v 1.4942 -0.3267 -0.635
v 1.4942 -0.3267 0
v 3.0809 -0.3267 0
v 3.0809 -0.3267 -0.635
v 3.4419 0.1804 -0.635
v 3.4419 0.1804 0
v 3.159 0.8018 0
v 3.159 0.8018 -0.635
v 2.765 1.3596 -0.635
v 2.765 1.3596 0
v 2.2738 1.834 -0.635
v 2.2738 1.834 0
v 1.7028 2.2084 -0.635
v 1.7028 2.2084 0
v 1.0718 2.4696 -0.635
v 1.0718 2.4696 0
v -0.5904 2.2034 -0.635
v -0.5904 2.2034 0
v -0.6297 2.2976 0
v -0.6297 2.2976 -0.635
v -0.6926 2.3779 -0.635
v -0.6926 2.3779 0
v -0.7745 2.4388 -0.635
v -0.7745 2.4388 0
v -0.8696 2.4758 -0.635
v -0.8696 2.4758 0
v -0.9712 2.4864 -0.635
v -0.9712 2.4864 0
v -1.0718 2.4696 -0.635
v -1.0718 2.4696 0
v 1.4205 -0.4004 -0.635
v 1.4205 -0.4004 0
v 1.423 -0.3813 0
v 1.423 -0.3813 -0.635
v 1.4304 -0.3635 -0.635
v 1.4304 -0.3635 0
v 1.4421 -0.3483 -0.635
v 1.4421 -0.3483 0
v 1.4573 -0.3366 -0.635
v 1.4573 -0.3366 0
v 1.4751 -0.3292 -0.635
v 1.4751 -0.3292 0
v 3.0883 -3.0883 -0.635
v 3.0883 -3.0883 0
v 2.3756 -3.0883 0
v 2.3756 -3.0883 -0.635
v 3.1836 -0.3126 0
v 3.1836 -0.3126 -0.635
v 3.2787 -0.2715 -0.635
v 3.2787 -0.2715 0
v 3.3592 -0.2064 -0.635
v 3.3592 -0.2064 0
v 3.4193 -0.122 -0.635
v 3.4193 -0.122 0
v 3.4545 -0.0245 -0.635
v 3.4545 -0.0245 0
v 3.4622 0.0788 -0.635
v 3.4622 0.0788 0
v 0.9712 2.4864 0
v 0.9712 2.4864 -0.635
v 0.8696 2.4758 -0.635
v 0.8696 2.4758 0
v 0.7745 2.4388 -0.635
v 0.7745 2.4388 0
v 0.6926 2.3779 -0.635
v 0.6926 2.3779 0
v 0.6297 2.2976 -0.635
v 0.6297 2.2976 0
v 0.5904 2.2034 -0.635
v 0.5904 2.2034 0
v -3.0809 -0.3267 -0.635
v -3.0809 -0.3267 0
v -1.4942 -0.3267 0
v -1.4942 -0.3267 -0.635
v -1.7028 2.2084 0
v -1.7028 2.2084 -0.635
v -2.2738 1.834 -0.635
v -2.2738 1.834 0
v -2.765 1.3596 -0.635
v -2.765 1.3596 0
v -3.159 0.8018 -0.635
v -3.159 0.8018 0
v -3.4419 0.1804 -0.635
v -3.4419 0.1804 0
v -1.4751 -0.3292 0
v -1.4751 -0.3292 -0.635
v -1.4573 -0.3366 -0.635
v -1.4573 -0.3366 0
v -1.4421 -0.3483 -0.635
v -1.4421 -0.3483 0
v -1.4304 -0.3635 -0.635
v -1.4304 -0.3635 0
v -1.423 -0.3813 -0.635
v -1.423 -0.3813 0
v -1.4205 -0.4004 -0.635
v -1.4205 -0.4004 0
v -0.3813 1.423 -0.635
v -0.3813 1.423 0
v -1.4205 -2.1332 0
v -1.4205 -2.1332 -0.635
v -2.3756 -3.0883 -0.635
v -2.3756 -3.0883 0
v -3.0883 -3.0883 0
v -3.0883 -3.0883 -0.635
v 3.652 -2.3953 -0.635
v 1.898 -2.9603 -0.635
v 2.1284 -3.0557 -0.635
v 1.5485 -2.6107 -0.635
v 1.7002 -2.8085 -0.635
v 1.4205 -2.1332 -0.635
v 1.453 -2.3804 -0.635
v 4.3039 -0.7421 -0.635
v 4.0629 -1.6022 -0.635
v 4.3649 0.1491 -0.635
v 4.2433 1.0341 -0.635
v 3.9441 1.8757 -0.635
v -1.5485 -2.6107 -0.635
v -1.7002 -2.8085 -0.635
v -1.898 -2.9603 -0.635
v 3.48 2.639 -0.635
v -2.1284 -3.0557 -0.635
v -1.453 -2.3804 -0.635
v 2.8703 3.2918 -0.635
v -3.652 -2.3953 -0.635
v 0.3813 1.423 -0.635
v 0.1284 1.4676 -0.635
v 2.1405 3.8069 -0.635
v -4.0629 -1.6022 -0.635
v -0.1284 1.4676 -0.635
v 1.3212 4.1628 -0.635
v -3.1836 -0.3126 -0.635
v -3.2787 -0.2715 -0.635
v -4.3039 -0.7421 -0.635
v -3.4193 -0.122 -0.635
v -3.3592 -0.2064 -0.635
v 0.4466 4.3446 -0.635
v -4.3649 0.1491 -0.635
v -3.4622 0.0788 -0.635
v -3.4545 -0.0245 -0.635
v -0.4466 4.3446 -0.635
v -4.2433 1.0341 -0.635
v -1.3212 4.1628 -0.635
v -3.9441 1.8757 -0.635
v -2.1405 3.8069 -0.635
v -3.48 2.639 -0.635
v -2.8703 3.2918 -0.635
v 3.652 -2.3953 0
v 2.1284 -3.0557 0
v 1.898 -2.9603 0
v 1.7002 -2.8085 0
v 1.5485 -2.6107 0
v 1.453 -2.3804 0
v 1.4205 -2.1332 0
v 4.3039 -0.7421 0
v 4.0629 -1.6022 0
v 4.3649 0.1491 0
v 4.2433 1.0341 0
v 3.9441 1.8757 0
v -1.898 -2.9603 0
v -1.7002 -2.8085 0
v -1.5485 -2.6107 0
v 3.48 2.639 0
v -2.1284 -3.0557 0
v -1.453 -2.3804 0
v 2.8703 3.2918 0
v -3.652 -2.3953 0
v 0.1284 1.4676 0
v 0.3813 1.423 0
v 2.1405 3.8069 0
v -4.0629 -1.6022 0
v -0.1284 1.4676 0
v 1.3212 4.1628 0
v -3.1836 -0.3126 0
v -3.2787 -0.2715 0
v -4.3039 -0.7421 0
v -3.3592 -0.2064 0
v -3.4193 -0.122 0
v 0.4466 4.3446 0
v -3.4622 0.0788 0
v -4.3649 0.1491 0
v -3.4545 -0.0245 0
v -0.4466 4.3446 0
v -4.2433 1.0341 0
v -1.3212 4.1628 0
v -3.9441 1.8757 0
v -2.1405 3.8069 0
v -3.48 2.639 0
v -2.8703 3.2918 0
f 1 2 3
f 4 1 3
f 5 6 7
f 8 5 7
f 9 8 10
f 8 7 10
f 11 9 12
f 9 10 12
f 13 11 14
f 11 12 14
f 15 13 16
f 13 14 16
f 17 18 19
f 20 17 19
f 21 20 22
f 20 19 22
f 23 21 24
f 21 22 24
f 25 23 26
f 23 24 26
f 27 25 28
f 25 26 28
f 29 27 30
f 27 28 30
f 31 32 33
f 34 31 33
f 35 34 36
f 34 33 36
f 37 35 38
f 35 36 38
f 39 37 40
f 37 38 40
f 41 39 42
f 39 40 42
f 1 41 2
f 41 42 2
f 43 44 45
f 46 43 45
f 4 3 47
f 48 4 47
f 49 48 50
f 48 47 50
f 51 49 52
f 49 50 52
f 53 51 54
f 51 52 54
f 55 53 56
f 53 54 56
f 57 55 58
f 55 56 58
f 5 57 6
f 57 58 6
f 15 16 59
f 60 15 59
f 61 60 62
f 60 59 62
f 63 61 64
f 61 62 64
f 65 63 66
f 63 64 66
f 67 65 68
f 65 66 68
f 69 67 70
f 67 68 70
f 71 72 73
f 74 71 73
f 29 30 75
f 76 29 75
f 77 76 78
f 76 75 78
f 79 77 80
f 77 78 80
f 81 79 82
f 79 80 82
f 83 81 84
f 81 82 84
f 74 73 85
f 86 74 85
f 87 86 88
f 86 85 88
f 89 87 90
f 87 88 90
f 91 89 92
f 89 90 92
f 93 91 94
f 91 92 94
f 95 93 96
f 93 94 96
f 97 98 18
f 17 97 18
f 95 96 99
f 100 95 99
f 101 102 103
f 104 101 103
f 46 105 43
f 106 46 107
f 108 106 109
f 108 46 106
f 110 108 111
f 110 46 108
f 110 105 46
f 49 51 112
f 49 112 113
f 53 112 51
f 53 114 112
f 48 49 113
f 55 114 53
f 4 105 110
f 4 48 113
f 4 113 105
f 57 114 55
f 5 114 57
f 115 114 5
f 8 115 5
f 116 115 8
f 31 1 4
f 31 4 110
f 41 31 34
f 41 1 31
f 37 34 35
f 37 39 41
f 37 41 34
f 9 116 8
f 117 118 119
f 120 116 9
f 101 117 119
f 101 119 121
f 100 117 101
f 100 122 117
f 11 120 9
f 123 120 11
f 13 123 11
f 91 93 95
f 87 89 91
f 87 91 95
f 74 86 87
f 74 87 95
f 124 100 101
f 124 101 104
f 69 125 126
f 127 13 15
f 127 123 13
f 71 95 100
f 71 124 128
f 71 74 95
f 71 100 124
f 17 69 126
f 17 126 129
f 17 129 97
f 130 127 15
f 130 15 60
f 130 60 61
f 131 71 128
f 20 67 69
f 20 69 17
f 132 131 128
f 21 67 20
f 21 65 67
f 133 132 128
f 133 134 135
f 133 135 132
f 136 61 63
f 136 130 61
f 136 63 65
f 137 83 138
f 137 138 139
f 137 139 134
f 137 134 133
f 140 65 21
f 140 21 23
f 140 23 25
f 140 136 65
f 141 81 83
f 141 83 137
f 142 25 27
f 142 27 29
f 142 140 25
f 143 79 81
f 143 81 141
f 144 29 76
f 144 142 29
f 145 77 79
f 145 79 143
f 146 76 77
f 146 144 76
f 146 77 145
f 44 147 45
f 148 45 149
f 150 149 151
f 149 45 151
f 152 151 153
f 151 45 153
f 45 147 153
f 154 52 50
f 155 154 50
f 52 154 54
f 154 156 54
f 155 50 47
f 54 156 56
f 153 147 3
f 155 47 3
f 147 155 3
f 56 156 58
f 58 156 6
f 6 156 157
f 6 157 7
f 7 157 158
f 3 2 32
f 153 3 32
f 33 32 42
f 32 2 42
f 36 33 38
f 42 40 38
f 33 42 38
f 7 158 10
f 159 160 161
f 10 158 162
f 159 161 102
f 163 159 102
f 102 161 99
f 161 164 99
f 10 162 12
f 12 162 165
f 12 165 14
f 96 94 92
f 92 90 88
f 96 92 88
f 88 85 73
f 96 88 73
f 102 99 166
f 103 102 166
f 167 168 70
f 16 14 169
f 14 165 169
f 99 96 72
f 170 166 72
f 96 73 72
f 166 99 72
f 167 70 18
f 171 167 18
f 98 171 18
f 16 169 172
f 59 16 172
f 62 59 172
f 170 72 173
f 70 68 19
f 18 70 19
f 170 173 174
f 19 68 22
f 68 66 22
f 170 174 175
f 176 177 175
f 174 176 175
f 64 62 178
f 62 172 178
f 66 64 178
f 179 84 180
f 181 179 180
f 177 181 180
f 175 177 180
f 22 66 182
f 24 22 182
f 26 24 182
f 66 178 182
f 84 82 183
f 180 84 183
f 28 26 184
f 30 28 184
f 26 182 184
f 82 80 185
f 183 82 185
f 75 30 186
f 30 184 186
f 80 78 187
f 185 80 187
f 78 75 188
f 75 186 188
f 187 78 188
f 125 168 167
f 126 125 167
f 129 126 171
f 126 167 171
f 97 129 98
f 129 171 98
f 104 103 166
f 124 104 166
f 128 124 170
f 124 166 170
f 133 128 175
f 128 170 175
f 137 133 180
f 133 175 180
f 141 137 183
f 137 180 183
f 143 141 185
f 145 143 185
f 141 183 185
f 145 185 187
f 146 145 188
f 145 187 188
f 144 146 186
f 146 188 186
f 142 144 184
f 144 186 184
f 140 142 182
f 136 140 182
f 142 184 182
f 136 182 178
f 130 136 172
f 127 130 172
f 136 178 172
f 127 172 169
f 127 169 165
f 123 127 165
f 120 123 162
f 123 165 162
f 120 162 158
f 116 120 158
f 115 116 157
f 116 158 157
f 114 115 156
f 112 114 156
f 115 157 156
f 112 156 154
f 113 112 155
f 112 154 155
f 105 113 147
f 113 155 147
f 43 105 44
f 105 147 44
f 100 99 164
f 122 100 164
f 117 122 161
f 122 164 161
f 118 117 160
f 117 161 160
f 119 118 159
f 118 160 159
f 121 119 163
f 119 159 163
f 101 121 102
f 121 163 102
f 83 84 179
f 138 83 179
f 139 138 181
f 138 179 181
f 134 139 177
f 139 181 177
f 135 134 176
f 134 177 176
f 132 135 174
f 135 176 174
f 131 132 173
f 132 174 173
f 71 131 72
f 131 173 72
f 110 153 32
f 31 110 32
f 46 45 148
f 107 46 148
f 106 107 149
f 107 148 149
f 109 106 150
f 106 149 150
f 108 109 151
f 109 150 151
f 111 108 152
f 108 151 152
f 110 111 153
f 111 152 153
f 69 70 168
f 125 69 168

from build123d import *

# Parameters (mm, degrees)
BODY_DEPTH = 0.635


with BuildPart() as part:
    # BodySke → Body (new body)
    with BuildSketch(Plane.XY):
        with BuildLine():
            Line((3.08825445, -3.08825445), (2.375594962, -3.08825445))
            ThreePointArc((2.375594962, -3.08825445), (1.700235197, -2.808511276), (1.420492024, -2.133151512))
            Line((1.420492024, -2.133151512), (1.420492024, -0.400356828))
            ThreePointArc((1.420492024, -0.400356828), (1.442066538, -0.348271343), (1.494152024, -0.326696828))
            Line((1.494152024, -0.326696828), (3.080912536, -0.326696828))
            ThreePointArc((3.080912536, -0.326696828), (3.392132841, -0.166234942), (3.441920608, 0.180358874))
            ThreePointArc((3.441920608, 0.180358874), (2.530552339, 1.608327553), (1.071838527, 2.46962929))
            ThreePointArc((1.071838527, 2.46962929), (0.774531372, 2.438826913), (0.590394611, 2.203382686))
            Line((0.590394611, 2.203382686), (0.381292217, 1.423001927))
            ThreePointArc((0.381292217, 1.423001927), (0, 1.4732), (-0.381292217, 1.423001927))
            Line((-0.381292217, 1.423001927), (-0.590394611, 2.203382686))
            ThreePointArc((-0.590394611, 2.203382686), (-0.774531372, 2.438826913), (-1.071838527, 2.46962929))
            ThreePointArc((-1.071838527, 2.46962929), (-2.530552339, 1.608327553), (-3.441920608, 0.180358874))
            ThreePointArc((-3.441920608, 0.180358874), (-3.392132841, -0.166234942), (-3.080912536, -0.326696828))
            Line((-3.080912536, -0.326696828), (-1.494152024, -0.326696828))
            ThreePointArc((-1.494152024, -0.326696828), (-1.442066538, -0.348271343), (-1.420492024, -0.400356828))
            Line((-1.420492024, -0.400356828), (-1.420492024, -2.133151512))
            ThreePointArc((-1.420492024, -2.133151512), (-1.700235197, -2.808511276), (-2.375594962, -3.08825445))
            Line((-2.375594962, -3.08825445), (-3.08825445, -3.08825445))
            ThreePointArc((-3.08825445, -3.08825445), (0, 4.367451327), (3.08825445, -3.08825445))
        make_face()
    extrude(amount=-BODY_DEPTH)


solid = part.part
